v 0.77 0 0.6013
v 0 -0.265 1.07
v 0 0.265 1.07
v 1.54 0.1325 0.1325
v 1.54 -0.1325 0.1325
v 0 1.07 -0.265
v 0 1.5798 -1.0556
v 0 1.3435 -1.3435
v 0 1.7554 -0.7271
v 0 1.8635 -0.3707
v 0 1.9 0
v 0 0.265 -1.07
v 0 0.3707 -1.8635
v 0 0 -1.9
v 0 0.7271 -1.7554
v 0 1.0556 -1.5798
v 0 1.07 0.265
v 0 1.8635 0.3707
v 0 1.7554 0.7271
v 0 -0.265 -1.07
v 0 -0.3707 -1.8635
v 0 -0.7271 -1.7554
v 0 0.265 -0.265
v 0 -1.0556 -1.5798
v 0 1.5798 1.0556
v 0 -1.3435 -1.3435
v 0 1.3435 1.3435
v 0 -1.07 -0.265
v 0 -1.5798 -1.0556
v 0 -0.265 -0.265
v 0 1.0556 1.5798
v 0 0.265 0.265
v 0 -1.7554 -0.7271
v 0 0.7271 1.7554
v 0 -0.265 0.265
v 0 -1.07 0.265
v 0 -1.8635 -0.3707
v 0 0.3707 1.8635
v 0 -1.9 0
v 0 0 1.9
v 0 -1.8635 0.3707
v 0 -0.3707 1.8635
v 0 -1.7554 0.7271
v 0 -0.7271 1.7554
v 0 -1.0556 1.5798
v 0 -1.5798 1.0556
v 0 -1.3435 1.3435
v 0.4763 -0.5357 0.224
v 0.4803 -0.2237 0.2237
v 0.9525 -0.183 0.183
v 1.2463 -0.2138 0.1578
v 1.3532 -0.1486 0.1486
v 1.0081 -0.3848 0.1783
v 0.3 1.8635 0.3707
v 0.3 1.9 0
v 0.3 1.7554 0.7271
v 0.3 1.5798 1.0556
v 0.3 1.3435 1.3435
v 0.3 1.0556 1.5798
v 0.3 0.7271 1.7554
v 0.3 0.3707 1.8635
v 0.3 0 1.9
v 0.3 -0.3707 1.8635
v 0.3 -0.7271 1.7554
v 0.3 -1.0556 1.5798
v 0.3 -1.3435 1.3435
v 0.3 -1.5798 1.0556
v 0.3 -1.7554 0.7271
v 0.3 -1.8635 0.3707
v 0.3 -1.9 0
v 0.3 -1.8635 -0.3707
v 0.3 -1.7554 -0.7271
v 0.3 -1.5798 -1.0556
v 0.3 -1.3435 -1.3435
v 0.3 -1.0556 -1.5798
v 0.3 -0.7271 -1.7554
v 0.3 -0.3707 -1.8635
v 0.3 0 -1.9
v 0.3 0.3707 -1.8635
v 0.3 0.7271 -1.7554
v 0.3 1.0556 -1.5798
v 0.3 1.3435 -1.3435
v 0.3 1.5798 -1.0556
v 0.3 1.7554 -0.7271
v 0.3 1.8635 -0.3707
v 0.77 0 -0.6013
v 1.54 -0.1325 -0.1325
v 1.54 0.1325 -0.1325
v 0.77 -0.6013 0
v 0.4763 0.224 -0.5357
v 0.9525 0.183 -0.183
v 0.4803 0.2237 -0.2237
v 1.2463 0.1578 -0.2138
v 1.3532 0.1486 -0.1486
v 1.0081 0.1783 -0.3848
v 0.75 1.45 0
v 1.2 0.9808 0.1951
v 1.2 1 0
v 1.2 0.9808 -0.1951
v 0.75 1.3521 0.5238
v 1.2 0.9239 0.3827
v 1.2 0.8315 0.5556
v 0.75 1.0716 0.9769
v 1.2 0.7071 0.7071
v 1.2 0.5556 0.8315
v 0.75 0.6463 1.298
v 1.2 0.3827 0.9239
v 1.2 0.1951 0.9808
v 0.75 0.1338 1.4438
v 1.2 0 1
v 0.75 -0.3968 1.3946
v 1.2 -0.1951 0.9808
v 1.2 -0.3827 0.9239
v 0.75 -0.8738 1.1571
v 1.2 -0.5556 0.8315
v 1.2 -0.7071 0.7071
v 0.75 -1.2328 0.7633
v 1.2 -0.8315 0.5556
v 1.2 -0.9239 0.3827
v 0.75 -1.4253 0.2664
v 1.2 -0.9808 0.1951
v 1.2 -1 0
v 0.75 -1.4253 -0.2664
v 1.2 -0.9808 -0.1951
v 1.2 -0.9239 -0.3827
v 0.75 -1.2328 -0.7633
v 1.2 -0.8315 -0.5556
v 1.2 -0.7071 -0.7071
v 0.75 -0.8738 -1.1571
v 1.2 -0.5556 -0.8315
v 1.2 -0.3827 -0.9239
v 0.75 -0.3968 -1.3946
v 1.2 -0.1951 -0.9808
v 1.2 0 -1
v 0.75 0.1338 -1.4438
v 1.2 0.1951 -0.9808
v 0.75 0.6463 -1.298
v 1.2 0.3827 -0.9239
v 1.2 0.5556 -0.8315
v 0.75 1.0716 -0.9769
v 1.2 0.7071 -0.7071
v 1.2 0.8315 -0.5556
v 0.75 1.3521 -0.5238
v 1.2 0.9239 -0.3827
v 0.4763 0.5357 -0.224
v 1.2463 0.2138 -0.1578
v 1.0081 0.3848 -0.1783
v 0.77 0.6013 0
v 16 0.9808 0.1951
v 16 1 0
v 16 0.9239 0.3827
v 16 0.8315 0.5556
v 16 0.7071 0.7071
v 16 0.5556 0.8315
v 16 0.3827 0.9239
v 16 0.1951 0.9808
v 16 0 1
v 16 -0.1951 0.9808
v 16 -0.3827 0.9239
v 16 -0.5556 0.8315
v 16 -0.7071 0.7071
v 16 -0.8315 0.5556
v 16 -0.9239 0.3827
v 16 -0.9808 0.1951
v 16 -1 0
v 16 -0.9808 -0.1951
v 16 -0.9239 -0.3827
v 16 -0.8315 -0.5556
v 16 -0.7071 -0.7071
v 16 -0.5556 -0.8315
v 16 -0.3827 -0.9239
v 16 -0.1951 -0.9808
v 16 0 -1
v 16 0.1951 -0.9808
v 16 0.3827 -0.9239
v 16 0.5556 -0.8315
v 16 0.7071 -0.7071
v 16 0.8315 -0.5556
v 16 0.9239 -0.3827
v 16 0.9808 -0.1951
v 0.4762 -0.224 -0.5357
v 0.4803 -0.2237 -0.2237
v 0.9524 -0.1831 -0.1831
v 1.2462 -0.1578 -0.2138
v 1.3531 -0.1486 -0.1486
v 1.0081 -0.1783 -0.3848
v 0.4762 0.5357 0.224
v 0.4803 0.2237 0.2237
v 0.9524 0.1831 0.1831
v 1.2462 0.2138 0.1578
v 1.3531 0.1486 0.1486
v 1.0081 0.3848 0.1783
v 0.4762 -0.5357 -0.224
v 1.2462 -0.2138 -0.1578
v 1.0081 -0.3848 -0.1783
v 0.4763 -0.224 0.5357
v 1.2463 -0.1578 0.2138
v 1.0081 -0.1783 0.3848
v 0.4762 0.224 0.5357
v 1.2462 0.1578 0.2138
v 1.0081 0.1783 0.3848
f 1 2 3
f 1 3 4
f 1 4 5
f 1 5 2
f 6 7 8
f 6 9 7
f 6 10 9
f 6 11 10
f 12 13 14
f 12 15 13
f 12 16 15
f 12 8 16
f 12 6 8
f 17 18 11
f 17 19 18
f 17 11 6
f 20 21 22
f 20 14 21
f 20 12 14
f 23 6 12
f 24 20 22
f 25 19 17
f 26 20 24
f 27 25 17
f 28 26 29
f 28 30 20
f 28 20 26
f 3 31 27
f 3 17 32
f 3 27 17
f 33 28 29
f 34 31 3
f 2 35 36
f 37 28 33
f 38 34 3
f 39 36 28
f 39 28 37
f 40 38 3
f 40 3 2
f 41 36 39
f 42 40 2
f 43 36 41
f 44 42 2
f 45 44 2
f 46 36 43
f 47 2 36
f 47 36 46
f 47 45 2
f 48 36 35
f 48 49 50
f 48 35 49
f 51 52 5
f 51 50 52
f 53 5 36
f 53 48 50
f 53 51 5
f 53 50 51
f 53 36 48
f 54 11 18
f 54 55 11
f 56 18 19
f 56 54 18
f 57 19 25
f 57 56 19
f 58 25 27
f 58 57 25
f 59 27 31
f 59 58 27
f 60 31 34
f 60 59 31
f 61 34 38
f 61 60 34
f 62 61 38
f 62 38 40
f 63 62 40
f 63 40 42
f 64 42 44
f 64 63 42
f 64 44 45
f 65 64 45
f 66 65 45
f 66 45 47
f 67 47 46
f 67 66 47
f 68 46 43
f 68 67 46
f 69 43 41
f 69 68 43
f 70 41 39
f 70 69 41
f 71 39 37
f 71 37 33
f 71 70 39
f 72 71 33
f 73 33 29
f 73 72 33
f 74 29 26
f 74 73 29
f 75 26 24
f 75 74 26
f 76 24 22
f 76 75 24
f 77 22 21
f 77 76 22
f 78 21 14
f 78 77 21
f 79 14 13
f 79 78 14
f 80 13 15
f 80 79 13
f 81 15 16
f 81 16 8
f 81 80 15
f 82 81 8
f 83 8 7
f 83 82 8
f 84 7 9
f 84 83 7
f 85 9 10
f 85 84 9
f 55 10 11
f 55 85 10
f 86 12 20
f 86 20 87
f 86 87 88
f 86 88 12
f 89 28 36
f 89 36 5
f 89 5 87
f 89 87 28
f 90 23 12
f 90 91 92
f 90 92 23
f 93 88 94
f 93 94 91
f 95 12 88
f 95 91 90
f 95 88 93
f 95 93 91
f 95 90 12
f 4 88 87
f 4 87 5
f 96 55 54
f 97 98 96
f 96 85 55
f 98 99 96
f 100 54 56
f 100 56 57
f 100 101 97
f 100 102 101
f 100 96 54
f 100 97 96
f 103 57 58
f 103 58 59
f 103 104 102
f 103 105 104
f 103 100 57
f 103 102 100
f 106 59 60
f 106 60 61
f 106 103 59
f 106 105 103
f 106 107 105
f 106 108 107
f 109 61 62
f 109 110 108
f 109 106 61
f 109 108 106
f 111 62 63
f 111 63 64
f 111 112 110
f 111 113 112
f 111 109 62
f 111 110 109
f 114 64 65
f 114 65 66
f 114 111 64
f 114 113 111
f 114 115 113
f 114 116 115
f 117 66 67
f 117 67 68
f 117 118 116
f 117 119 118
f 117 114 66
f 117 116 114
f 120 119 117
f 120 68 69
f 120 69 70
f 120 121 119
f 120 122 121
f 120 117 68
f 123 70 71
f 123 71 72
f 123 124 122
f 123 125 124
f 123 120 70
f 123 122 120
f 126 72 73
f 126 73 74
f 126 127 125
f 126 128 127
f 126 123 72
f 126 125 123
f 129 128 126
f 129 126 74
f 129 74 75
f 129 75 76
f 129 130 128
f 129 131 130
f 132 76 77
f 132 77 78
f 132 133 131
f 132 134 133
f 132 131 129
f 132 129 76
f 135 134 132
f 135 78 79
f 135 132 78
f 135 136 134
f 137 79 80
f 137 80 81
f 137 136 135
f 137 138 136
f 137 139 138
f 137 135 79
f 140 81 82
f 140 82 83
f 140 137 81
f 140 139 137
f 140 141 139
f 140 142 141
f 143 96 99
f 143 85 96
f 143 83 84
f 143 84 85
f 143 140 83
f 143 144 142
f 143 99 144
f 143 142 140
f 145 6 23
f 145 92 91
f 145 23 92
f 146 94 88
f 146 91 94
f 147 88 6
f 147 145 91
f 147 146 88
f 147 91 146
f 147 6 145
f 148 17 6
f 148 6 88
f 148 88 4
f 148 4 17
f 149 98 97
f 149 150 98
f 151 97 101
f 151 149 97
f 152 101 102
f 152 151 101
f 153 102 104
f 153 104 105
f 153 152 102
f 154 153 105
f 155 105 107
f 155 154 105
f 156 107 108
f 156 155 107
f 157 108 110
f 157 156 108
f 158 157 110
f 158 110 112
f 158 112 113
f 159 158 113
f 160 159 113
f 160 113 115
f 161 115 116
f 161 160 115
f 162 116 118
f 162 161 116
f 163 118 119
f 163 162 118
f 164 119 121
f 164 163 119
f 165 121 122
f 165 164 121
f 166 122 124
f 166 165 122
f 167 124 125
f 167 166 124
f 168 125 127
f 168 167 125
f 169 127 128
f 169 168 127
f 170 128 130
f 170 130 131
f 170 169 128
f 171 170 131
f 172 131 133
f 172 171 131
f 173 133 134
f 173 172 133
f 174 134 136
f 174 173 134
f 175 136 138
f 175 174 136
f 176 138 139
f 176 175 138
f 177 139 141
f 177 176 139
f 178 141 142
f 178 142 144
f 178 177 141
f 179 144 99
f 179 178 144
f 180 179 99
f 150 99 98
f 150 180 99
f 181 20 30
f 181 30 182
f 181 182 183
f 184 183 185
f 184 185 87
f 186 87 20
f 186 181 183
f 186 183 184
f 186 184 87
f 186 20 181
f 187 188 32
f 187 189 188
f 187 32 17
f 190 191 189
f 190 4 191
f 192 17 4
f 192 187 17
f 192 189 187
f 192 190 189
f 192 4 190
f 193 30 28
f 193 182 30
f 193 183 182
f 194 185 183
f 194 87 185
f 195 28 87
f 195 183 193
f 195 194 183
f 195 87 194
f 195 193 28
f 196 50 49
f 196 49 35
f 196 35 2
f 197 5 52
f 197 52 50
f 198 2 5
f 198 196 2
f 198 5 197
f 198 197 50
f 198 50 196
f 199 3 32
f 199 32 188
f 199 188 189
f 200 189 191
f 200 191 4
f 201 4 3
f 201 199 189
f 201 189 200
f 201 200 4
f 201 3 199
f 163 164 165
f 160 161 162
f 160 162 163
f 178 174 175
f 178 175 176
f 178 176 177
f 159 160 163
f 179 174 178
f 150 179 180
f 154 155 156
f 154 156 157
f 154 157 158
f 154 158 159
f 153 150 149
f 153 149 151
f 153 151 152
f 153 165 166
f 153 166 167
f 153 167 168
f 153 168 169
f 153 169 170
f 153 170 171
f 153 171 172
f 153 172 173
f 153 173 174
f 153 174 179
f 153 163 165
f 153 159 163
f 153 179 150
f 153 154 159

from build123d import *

# Parameters (mm, degrees)
SKETCH3_W         = 0.53
SKETCH3_H         = 2.14
SKETCH4_W         = 0.265
SKETCH4_H         = 0.265
CIRPATTERN1_COUNT = 2
CIRPATTERN1_ANGLE = 90


with BuildPart() as part:
    # BodySke → Base-Revolve (revolve)
    with BuildSketch(Plane.XY):
        Polygon((0, 0), (0, 1.9), (0.3, 1.9), (1.2, 1), (16, 1), (16, 0), align=None)
    revolve(axis=Axis((-6.35, 0, 0), (1, 0, 0)))

    # Sketch3 → Cross section 0
    with BuildSketch(Plane.ZY):
        Rectangle(SKETCH3_W, SKETCH3_H)
    # Sketch4 → Cross section 1
    with BuildSketch(Plane.ZY.offset(-1.54)):
        Rectangle(SKETCH4_W, SKETCH4_H)
    cross = loft(mode=Mode.SUBTRACT)

    # CirPattern1: Cross ×2 about axis
    cirpattern1_axis = Axis((0, 0, 0), (1, 0, 0))
    for i in range(1, CIRPATTERN1_COUNT):
        add(cross.rotate(cirpattern1_axis, i * CIRPATTERN1_ANGLE / (CIRPATTERN1_COUNT - 1)), mode=Mode.SUBTRACT)


solid = part.part
